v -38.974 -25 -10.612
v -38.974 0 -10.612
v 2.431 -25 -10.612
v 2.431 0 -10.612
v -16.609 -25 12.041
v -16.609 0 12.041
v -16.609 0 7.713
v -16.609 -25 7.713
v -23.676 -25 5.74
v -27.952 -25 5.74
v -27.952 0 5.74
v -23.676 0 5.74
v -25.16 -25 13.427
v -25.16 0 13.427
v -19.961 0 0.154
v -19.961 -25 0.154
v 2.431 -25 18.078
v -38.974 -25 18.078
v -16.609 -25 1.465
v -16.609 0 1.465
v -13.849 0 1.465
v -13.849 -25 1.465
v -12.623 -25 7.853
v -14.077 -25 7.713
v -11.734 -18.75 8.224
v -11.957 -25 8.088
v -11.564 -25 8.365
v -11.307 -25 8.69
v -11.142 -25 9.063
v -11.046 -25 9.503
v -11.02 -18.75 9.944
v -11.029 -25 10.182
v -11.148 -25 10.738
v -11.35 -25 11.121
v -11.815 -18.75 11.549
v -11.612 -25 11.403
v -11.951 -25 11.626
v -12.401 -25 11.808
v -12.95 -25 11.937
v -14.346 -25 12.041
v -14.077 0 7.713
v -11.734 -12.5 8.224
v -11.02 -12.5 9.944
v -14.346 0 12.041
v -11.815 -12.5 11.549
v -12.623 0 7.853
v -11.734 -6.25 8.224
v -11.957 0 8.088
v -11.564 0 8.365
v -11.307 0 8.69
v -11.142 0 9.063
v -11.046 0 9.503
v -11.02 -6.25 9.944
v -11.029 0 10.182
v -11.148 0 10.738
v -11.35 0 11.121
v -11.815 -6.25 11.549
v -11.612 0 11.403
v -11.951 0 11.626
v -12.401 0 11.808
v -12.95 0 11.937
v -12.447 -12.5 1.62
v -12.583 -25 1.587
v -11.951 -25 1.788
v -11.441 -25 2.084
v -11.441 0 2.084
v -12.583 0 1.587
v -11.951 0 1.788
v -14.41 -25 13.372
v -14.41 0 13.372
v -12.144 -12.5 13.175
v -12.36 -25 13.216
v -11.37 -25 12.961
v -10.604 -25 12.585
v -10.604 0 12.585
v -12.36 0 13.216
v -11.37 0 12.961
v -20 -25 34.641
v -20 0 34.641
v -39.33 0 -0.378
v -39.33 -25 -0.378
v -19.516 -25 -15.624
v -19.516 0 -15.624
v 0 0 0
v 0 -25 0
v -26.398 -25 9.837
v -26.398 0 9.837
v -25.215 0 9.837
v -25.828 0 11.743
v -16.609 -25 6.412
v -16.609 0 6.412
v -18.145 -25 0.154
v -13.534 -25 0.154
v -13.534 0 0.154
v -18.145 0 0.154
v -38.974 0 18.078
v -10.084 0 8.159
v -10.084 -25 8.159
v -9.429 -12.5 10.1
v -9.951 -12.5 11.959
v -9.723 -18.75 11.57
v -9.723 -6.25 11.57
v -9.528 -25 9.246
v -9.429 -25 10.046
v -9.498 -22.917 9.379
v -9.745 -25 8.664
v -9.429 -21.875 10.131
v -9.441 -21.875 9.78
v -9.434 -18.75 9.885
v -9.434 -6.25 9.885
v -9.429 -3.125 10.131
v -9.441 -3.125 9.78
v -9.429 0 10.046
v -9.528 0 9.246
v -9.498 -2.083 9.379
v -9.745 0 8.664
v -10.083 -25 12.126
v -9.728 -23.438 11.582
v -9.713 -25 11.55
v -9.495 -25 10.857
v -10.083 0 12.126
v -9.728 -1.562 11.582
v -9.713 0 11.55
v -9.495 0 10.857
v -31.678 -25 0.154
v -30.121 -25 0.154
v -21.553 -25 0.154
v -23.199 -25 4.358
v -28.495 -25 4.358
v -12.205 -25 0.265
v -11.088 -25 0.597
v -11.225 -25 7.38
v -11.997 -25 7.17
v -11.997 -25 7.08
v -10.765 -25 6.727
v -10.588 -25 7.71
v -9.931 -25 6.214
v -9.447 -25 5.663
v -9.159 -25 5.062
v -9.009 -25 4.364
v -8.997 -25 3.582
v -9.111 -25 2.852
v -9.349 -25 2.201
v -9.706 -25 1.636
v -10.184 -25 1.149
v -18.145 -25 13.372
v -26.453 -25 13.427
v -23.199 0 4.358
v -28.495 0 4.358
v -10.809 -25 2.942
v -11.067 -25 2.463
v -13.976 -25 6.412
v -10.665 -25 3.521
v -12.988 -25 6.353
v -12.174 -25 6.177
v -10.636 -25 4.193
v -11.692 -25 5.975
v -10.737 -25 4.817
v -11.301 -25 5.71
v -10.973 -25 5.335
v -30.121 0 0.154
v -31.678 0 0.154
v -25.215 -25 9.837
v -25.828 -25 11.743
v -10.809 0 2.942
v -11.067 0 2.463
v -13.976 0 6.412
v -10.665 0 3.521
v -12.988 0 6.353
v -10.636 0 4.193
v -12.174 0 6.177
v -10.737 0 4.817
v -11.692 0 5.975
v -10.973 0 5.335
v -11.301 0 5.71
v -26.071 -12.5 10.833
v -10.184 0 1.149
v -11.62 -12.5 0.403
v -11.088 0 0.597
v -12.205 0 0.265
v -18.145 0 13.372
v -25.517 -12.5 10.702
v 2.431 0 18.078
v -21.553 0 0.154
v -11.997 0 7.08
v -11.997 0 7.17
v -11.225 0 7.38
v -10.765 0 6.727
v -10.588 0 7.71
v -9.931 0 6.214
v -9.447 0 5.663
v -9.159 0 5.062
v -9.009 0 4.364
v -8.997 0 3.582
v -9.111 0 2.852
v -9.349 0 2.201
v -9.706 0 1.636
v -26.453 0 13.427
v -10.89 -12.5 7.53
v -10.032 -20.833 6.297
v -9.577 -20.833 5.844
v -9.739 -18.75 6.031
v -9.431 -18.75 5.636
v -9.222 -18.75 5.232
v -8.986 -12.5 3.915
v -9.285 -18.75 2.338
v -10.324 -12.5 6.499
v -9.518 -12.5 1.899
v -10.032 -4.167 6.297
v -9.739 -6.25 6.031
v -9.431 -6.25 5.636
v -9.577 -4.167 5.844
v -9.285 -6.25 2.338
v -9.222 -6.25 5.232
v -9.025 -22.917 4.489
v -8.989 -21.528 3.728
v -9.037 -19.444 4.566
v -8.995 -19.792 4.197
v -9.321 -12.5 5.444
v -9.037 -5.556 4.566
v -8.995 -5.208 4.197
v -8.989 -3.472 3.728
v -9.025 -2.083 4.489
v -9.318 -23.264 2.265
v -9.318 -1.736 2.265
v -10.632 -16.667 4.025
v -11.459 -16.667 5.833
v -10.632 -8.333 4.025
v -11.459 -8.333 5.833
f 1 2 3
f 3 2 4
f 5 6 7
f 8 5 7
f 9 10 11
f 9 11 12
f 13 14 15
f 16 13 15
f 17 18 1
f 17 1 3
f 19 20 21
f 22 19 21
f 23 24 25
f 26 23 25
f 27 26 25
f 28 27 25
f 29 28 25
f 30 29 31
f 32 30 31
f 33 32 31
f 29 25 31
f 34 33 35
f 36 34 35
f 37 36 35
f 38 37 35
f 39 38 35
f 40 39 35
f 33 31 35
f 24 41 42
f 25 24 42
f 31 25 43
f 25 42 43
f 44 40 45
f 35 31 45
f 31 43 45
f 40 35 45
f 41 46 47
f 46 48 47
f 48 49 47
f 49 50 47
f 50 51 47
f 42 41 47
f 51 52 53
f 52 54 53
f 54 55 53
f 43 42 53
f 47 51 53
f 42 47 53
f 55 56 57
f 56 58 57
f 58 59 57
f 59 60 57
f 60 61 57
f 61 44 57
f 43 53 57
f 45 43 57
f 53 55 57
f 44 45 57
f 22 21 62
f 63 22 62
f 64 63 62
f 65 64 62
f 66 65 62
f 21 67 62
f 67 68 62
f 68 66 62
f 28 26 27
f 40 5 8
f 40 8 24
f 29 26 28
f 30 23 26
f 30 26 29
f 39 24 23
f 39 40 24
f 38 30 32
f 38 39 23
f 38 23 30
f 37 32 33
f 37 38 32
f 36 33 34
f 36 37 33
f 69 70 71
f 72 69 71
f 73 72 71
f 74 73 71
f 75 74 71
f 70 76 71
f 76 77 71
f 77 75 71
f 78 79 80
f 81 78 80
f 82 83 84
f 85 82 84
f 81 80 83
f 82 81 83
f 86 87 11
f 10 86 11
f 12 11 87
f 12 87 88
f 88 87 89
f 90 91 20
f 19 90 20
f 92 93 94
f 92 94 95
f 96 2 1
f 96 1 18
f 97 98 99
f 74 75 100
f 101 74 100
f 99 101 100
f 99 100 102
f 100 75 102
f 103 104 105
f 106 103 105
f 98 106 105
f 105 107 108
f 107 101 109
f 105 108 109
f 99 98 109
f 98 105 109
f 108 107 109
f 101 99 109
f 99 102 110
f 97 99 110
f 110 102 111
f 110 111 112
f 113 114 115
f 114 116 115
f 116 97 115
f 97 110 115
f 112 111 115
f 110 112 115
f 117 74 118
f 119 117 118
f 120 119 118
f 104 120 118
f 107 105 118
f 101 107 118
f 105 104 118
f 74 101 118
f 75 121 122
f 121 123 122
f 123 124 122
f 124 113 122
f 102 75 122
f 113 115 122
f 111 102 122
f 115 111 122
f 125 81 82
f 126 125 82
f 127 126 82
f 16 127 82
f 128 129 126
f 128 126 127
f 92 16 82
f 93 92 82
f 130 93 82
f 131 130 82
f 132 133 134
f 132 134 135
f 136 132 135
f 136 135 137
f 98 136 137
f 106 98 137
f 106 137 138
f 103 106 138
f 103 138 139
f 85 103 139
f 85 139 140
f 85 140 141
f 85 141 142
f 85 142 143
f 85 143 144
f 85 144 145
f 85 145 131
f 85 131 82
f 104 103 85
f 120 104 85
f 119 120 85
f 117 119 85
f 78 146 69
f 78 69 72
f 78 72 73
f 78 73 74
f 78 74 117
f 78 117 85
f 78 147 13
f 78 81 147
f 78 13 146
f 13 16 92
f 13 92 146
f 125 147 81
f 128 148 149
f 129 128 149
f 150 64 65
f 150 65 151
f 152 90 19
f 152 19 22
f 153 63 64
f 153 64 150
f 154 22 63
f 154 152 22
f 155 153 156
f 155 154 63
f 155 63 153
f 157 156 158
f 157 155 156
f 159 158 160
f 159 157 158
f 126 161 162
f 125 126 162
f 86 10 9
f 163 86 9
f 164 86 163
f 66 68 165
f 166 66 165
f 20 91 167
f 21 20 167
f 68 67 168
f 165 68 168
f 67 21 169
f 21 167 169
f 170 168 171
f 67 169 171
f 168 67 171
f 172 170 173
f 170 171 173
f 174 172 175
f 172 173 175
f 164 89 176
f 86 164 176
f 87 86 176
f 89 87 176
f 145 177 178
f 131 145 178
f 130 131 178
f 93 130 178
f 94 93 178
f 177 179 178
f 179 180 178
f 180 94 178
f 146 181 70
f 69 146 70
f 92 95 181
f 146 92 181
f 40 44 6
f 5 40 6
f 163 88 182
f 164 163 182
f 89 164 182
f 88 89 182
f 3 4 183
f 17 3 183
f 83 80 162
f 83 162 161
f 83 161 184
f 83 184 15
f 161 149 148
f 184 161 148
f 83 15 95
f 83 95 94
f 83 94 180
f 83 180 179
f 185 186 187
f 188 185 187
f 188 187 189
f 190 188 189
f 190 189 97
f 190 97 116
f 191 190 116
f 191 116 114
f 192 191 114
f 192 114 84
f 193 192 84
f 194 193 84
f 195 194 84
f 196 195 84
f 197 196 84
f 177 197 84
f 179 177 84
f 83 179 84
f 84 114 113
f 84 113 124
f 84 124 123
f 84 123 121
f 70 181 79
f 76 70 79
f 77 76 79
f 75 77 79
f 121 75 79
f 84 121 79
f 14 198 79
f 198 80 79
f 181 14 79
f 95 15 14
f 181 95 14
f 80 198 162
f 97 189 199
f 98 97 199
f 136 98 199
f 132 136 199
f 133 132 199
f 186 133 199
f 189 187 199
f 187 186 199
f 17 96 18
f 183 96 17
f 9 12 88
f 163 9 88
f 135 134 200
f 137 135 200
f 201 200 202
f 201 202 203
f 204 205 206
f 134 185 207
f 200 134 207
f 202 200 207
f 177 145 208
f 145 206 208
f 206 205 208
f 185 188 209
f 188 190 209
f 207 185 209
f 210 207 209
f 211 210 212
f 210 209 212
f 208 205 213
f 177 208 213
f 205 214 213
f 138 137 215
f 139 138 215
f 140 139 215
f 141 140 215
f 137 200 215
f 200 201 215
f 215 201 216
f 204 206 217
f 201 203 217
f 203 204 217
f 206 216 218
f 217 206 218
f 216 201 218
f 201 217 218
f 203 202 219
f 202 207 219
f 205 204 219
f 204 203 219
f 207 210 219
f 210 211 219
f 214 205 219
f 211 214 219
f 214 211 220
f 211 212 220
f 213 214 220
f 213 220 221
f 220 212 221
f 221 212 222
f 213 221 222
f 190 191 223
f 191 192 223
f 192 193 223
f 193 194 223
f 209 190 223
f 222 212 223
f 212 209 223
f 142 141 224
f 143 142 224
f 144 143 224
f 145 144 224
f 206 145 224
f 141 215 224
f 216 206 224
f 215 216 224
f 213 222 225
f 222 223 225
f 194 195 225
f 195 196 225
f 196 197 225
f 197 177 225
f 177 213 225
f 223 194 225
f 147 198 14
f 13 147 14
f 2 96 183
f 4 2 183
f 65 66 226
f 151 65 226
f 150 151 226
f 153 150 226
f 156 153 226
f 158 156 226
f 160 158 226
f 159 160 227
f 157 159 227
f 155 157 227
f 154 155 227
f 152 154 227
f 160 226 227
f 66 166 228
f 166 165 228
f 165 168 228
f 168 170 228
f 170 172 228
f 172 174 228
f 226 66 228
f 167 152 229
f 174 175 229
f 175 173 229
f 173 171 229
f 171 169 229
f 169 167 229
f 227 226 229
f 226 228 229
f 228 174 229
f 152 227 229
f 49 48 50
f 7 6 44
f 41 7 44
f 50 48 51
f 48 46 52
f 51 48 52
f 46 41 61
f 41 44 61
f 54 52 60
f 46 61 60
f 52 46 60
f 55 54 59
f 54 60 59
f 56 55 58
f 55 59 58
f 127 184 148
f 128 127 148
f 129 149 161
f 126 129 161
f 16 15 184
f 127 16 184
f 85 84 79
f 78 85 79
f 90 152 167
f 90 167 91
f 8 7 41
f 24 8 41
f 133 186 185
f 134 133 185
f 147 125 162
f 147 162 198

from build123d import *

# Parameters (mm, degrees)
F1_DEPTH = 25
F2_W     = 41.4044458885
F2_H     = 28.690431267
F3_DEPTH = 25


with BuildPart() as f1:
    # F0 (on Front) → F1 (new body)
    with BuildSketch(Plane.XZ):
        Polygon((-20, 34.6410161514), (-39.3296403253, -0.3784784894), (-19.5162861858, -15.6241663302), (0, 0), align=None)
        Polygon((-19.961485454, 0.1543219155), (-21.5525655212, 0.1543219155), (-23.1986101725, 4.3576661656), (-28.4954603596, 4.3576661656), (-30.121254901, 0.1543219155), (-31.6776204939, 0.1543219155), (-26.453092128, 13.4268225484), (-25.1599779643, 13.4268225484), align=None, mode=Mode.SUBTRACT)
        with BuildLine():
            Line((-18.1447613046, 0.1543219155), (-18.1447613046, 13.3718579642))
            Line((-18.1447613046, 13.3718579642), (-14.4100624561, 13.3718579642))
            add(Edge.make_bspline(
                [(-14.4100624561, 13.3718579642), (-11.780441036, 13.3718579642), (-10.6044882227, 12.5849965492)],
                knots=[0, 0, 0, 1, 1, 1], degree=2))
            add(Edge.make_bspline(
                [(-10.6044882227, 12.5849965492), (-9.4285354095, 11.7981351342), (-9.4285354095, 10.1000187716)],
                knots=[0, 0, 0, 1, 1, 1], degree=2))
            add(Edge.make_bspline(
                [(-9.4285354095, 10.1000187716), (-9.4285354095, 8.9226195219), (-10.0837711099, 8.1589010897)],
                knots=[0, 0, 0, 1, 1, 1], degree=2))
            add(Edge.make_bspline(
                [(-10.0837711099, 8.1589010897), (-10.7390068102, 7.3951826575), (-11.9974064997, 7.1695385752)],
                knots=[0, 0, 0, 1, 1, 1], degree=2))
            Line((-11.9974064997, 7.1695385752), (-11.9974064997, 7.0798595169))
            add(Edge.make_bspline(
                [(-11.9974064997, 7.0798595169), (-8.9859258635, 6.5649281497), (-8.9859258635, 3.9150566197)],
                knots=[0, 0, 0, 1, 1, 1], degree=2))
            add(Edge.make_bspline(
                [(-8.9859258635, 3.9150566197), (-8.9859258635, 2.1446184359), (-10.1835752232, 1.1494701757)],
                knots=[0, 0, 0, 1, 1, 1], degree=2))
            add(Edge.make_bspline(
                [(-10.1835752232, 1.1494701757), (-11.3812245828, 0.1543219155), (-13.5335219827, 0.1543219155)],
                knots=[0, 0, 0, 1, 1, 1], degree=2))
            Line((-13.5335219827, 0.1543219155), (-18.1447613046, 0.1543219155))
        make_face(mode=Mode.SUBTRACT)
    extrude(amount=F1_DEPTH)


with BuildPart() as f1b:
    # F0 (on Front) → F1, piece 2 (new body)
    with BuildSketch(Plane.XZ):
        with BuildLine():
            Line((-27.951600264, 5.7404593876), (-23.6759341926, 5.7404593876))
            Line((-23.6759341926, 5.7404593876), (-25.2149425485, 9.8367673423))
            add(Edge.make_bspline(
                [(-25.2149425485, 9.8367673423), (-25.5129084519, 10.6149501388), (-25.8282315925, 11.74317055)],
                knots=[0, 0, 0, 1, 1, 1], degree=2))
            add(Edge.make_bspline(
                [(-25.8282315925, 11.74317055), (-26.0278398191, 10.8753086952), (-26.3981275438, 9.8367673423)],
                knots=[0, 0, 0, 1, 1, 1], degree=2))
            Line((-26.3981275438, 9.8367673423), (-27.951600264, 5.7404593876))
        make_face()
    extrude(amount=F1_DEPTH)


with BuildPart() as f1c:
    # F0 (on Front) → F1, piece 3 (new body)
    with BuildSketch(Plane.XZ):
        with BuildLine():
            Line((-16.6086458216, 12.0411364535), (-16.6086458216, 7.7133986709))
            Line((-16.6086458216, 7.7133986709), (-14.0773820784, 7.7133986709))
            add(Edge.make_bspline(
                [(-14.0773820784, 7.7133986709), (-12.4486946642, 7.7133986709), (-11.7341550704, 8.2239907288)],
                knots=[0, 0, 0, 1, 1, 1], degree=2))
            add(Edge.make_bspline(
                [(-11.7341550704, 8.2239907288), (-11.0196154766, 8.7345827867), (-11.0196154766, 9.9438036377)],
                knots=[0, 0, 0, 1, 1, 1], degree=2))
            add(Edge.make_bspline(
                [(-11.0196154766, 9.9438036377), (-11.0196154766, 11.0575596847), (-11.8151555102, 11.5493480691)],
                knots=[0, 0, 0, 1, 1, 1], degree=2))
            add(Edge.make_bspline(
                [(-11.8151555102, 11.5493480691), (-12.6106955438, 12.0411364535), (-14.3464192534, 12.0411364535)],
                knots=[0, 0, 0, 1, 1, 1], degree=2))
            Line((-14.3464192534, 12.0411364535), (-16.6086458216, 12.0411364535))
        make_face()
    extrude(amount=F1_DEPTH)


with BuildPart() as f1d:
    # F0 (on Front) → F1, piece 4 (new body)
    with BuildSketch(Plane.XZ):
        with BuildLine():
            Line((-13.9761315287, 6.4116058887), (-16.6086458216, 6.4116058887))
            Line((-16.6086458216, 6.4116058887), (-16.6086458216, 1.4647933163))
            Line((-16.6086458216, 1.4647933163), (-13.8488451233, 1.4647933163))
            add(Edge.make_bspline(
                [(-13.8488451233, 1.4647933163), (-12.2490864376, 1.4647933163), (-11.4405284762, 2.083868106)],
                knots=[0, 0, 0, 1, 1, 1], degree=2))
            add(Edge.make_bspline(
                [(-11.4405284762, 2.083868106), (-10.6319705148, 2.7029428958), (-10.6319705148, 4.0249857879)],
                knots=[0, 0, 0, 1, 1, 1], degree=2))
            add(Edge.make_bspline(
                [(-10.6319705148, 4.0249857879), (-10.6319705148, 5.2544567489), (-11.4593321497, 5.8330313188)],
                knots=[0, 0, 0, 1, 1, 1], degree=2))
            add(Edge.make_bspline(
                [(-11.4593321497, 5.8330313188), (-12.2866937846, 6.4116058887), (-13.9761315287, 6.4116058887)],
                knots=[0, 0, 0, 1, 1, 1], degree=2))
        make_face()
    extrude(amount=F1_DEPTH)


with BuildPart() as f3:
    # F2 (on Front) → F3 (new body)
    with BuildSketch(Plane.XZ):
        with Locations((-18.2716822019, 3.7329476327)):
            Rectangle(F2_W, F2_H)
    extrude(amount=F3_DEPTH)


solid = Compound([f1.part, f1b.part, f1c.part, f1d.part, f3.part])
